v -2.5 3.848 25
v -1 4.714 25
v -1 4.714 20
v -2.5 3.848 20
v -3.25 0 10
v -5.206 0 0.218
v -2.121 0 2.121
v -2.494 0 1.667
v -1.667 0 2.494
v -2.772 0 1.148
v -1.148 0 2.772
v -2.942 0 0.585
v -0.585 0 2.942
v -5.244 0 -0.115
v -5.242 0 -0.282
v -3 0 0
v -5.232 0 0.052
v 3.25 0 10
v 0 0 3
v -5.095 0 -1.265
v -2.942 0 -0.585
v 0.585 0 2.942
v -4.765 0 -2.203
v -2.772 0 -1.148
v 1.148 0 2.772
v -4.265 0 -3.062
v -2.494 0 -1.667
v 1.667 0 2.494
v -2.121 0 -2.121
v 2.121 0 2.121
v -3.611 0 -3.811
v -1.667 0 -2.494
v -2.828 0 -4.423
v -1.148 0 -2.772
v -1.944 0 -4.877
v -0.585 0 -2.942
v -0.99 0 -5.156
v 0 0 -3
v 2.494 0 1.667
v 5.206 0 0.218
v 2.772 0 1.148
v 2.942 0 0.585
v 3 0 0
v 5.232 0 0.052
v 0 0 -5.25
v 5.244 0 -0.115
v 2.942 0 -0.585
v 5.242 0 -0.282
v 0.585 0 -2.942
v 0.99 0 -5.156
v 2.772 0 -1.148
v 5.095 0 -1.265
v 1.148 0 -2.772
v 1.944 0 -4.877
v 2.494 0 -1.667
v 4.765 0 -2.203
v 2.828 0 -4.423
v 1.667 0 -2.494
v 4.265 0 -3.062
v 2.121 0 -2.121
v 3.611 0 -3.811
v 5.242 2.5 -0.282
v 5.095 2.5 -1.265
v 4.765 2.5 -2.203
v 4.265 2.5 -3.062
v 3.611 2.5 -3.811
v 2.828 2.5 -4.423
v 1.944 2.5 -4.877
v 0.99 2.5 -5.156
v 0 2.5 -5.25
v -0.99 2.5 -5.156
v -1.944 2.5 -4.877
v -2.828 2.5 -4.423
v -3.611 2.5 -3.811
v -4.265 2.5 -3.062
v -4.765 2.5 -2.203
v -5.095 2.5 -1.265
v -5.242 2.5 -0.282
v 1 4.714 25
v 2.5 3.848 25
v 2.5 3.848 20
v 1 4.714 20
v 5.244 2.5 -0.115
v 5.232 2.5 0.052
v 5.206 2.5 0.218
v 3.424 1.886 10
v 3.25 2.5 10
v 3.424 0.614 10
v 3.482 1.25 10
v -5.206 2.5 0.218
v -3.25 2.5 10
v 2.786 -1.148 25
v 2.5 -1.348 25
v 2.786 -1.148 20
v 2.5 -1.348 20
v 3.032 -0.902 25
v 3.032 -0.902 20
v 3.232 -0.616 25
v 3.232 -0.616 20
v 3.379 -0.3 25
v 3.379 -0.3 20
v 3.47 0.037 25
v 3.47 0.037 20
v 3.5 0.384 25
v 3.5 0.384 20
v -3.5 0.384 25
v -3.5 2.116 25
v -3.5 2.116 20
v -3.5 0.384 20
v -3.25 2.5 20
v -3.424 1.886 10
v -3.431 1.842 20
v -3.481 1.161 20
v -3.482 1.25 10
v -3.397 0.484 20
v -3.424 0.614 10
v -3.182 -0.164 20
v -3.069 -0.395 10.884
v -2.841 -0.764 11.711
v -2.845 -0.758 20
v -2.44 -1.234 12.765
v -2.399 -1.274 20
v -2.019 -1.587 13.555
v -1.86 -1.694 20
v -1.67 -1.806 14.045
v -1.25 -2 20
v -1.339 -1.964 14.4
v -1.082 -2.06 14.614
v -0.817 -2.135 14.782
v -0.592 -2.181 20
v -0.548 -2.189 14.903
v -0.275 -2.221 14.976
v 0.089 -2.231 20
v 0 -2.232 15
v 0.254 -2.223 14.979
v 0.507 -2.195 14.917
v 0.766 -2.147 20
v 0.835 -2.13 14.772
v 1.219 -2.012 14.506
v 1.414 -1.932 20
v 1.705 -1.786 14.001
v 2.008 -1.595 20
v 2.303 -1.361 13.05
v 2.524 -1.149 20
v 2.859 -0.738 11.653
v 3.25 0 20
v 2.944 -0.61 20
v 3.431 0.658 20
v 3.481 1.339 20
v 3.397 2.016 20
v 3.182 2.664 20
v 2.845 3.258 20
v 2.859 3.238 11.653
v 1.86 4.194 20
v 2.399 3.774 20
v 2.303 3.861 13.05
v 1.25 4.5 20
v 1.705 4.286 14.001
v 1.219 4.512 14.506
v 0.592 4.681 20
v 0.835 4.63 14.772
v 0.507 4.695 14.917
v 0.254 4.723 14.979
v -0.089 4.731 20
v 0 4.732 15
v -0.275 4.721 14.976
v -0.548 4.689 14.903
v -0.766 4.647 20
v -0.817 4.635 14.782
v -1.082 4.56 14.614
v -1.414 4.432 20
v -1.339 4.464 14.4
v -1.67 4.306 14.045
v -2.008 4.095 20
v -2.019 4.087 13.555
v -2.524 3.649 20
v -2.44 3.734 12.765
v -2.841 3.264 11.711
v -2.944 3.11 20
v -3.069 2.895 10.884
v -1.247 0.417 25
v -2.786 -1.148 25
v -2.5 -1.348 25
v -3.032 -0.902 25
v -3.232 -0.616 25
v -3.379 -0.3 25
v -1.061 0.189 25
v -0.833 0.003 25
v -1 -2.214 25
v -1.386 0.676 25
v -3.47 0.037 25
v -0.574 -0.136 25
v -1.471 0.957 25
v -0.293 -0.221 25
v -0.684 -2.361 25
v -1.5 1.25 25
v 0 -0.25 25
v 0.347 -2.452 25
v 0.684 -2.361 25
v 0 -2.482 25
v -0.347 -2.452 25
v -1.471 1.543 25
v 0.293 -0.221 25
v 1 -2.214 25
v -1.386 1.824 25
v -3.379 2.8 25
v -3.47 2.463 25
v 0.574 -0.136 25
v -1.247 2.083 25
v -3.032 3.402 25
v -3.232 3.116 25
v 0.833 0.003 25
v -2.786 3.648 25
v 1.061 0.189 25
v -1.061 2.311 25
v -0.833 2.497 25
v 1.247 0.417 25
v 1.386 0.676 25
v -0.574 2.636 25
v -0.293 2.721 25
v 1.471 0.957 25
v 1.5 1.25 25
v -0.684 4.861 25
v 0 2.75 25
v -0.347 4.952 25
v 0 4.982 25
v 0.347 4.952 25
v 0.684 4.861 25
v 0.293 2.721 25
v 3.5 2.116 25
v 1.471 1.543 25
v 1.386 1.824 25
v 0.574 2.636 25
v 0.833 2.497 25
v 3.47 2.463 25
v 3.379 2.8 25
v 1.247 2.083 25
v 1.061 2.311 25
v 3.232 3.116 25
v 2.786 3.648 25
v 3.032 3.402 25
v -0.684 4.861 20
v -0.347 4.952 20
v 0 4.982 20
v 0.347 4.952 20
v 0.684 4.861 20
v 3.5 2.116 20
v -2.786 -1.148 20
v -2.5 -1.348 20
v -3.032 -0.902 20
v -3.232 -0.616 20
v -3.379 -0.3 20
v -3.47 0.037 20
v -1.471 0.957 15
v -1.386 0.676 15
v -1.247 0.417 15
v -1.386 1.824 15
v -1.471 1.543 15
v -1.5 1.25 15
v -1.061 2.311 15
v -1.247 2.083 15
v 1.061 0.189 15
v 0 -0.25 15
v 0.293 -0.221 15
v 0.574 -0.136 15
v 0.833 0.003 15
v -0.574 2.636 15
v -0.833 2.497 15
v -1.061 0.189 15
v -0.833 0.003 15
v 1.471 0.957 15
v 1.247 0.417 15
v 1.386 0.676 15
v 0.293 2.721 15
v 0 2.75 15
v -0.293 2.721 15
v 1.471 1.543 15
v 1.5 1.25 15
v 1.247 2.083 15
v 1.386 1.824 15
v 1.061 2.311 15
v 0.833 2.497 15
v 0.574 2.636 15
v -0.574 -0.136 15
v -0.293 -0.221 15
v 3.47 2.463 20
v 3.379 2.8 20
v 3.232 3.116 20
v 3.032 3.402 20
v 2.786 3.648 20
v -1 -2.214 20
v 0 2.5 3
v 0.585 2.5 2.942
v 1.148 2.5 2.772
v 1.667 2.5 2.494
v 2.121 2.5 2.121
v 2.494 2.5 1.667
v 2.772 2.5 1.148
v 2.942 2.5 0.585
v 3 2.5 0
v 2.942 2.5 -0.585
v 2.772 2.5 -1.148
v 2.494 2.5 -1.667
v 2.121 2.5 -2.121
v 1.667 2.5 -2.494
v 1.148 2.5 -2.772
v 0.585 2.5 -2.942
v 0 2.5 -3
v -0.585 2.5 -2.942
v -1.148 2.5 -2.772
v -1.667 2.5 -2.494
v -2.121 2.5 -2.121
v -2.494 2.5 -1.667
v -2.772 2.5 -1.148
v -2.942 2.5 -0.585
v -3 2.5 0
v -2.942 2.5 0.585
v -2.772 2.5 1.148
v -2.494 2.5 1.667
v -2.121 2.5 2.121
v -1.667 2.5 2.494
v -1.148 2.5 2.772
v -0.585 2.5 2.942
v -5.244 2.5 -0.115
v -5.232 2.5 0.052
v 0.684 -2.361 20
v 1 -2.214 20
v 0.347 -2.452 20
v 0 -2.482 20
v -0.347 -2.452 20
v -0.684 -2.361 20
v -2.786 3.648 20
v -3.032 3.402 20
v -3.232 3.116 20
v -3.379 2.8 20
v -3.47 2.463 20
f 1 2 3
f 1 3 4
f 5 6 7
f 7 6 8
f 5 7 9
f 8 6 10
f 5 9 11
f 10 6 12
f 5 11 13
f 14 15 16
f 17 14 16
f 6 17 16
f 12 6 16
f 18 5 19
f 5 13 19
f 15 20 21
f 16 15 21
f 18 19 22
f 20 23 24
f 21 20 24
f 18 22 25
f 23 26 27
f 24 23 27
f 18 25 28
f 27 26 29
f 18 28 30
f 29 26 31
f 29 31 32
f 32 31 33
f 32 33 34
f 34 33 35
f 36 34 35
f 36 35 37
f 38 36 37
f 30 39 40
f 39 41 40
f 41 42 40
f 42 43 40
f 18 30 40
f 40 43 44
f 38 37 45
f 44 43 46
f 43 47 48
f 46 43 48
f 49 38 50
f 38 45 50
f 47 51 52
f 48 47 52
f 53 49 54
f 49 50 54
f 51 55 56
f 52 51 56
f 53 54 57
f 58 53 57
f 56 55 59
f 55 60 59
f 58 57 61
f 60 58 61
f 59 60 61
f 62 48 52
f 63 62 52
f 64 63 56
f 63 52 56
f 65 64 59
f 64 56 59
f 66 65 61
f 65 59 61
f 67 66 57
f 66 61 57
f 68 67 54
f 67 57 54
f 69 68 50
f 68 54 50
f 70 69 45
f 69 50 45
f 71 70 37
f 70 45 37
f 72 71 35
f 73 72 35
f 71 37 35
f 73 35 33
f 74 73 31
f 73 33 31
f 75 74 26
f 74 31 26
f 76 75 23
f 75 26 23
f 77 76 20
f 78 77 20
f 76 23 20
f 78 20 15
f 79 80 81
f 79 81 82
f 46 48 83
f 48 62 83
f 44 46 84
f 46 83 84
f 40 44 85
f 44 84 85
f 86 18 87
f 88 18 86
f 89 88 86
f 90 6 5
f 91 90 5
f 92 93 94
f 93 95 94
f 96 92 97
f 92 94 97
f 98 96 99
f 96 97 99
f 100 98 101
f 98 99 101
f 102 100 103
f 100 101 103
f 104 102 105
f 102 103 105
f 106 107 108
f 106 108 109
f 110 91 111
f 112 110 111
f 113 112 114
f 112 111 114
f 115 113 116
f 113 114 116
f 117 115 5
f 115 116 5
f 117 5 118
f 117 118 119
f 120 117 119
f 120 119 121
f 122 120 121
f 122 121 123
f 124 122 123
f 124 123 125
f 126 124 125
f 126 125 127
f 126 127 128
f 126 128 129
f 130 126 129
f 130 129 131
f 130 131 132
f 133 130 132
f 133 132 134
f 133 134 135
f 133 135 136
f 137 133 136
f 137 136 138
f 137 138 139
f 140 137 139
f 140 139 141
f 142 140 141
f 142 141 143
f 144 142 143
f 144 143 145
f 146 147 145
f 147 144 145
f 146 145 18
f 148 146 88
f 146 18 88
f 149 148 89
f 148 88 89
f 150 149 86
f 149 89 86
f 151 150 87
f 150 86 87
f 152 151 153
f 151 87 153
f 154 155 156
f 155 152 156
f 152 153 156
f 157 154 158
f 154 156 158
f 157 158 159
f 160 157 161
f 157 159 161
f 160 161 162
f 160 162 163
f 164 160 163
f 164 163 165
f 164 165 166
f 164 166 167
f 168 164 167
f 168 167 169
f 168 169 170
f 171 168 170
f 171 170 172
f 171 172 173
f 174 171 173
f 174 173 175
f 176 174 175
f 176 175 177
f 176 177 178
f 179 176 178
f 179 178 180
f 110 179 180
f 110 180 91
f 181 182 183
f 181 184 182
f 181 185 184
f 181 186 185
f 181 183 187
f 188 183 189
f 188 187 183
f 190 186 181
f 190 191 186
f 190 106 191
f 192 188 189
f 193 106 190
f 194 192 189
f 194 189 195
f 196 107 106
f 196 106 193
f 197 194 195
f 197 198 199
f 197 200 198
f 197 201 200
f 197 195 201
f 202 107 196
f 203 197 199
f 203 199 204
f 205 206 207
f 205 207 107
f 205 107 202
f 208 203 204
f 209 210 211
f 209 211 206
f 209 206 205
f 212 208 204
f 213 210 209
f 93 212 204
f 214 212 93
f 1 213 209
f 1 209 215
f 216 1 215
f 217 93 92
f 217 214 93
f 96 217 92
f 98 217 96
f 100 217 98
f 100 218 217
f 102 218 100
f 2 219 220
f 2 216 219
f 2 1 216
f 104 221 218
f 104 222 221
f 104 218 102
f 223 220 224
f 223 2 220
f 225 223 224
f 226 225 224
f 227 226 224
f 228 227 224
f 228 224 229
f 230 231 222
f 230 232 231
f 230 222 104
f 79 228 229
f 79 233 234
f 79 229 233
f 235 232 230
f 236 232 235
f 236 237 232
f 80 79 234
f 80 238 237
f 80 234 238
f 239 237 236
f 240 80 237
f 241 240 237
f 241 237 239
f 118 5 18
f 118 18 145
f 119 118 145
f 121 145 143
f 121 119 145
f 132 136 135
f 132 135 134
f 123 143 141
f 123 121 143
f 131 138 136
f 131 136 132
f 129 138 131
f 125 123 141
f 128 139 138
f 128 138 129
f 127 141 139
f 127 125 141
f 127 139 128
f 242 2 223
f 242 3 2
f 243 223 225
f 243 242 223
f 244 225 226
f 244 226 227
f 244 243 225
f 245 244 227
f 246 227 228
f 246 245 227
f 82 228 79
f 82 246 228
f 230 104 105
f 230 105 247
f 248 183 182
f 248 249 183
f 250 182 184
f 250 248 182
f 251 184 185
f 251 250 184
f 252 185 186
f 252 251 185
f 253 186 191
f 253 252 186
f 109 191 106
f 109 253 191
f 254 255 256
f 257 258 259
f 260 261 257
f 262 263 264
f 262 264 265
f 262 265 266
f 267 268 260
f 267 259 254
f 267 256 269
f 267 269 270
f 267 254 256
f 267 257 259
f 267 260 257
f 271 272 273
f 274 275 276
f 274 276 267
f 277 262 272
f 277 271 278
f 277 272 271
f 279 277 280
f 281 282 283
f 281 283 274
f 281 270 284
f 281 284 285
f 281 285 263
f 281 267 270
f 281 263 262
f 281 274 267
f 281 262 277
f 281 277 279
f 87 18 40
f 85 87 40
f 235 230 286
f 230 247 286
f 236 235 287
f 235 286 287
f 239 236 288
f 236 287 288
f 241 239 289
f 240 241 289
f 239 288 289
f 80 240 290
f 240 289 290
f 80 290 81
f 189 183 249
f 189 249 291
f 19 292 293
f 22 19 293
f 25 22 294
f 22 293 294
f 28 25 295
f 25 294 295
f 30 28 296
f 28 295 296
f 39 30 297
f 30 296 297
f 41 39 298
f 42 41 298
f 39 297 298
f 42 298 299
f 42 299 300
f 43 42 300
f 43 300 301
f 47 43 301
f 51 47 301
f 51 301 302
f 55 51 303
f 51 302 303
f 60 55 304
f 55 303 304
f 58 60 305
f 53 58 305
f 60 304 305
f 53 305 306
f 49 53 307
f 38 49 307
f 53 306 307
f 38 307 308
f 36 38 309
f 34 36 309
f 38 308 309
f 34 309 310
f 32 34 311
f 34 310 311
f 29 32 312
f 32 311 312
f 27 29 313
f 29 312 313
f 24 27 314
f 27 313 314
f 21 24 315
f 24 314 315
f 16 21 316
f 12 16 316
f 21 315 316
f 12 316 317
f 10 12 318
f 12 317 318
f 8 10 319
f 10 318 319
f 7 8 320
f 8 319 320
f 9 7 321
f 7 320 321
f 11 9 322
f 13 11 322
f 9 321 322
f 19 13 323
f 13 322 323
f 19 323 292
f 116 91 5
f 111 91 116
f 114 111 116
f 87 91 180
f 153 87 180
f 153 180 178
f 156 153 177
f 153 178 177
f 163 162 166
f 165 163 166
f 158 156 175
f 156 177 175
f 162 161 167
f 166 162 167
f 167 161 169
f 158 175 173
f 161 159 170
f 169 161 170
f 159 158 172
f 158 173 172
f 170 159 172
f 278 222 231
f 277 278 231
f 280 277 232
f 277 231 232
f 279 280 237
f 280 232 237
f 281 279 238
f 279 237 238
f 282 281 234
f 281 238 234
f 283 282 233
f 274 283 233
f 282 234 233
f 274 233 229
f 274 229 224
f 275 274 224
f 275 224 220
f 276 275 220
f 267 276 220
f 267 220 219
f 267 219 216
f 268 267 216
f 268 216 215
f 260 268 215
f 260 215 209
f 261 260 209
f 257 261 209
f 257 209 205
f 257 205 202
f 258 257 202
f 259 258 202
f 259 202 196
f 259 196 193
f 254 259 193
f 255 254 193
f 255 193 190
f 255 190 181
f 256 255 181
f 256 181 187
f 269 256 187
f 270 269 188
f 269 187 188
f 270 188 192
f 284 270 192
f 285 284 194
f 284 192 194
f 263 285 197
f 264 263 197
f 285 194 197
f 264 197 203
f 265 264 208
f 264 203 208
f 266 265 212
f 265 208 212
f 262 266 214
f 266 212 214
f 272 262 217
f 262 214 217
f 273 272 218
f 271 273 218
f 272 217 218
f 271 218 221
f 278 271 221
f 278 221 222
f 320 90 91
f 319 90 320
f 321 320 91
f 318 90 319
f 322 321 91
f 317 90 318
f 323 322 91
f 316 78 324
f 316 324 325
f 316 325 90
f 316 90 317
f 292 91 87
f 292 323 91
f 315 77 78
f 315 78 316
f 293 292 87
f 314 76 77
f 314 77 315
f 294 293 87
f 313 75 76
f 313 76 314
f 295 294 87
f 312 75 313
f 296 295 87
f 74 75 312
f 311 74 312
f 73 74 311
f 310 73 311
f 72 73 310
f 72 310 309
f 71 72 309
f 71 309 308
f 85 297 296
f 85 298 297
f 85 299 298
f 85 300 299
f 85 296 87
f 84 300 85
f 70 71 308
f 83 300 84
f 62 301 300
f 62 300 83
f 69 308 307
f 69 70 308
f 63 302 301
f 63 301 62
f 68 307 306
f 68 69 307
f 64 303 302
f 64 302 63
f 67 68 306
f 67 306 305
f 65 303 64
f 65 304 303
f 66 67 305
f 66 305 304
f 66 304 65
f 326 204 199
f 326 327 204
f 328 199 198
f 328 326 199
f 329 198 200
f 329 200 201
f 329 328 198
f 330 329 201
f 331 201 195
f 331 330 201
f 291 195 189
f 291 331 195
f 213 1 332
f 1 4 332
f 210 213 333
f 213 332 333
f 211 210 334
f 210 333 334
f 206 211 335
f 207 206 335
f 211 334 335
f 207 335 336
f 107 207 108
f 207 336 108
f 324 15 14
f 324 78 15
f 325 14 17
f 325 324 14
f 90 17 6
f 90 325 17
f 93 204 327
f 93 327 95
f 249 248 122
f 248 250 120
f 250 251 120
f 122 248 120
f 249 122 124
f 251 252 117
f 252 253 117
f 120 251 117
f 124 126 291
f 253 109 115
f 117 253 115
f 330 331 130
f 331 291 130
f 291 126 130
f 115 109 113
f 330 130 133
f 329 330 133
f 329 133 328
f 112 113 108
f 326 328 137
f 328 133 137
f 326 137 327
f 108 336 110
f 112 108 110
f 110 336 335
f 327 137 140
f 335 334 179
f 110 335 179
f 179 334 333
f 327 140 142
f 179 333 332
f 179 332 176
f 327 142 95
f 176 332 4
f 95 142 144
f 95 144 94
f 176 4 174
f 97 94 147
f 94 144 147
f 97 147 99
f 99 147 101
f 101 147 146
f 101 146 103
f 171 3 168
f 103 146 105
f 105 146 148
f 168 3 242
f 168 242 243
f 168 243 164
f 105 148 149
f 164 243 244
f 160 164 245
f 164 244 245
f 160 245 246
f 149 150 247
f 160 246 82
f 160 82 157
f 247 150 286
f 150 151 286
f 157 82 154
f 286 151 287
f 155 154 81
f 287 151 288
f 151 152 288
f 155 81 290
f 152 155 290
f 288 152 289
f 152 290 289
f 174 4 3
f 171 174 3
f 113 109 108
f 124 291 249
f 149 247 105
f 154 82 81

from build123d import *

# Parameters (mm, degrees)
EXTRUDE_1_DEPTH          = 2.5
SKETCH_2_R               = 3
CUT_EXTRUDE_1_DEPTH      = 2.5
FILLET_1_R               = 2
SKETCH_3_R               = 3.482097069
EXTRUDE_2_DEPTH          = 15
CUT_EXTRUDE_2_DEPTH      = 15
CUT_EXTRUDE_2_DEPTH_BACK = 15
SKETCH_6_R               = 1.5
CUT_EXTRUDE_3_DEPTH      = 10
EXTRUDE_3_DEPTH          = 5
SKETCH_8_R               = 1.5
CUT_EXTRUDE_4_DEPTH      = 5
FILLET_2_R               = 2


with BuildPart() as part:
    # 草图1 → 凸台-拉伸1 (new body)
    with BuildSketch(Plane(origin=(0, 0, 0), x_dir=(1, 0, 0), z_dir=(0, 1, 0))):
        with BuildLine():
            ThreePointArc((5.25, 0), (0, 5.25), (-5.25, 0))
            Line((-5.25, 0), (-3.25, -10))
            Line((-3.25, -10), (3.25, -10))
            Line((3.25, -10), (5.25, 0))
        make_face()
    extrude(amount=EXTRUDE_1_DEPTH)

    # 草图2 → 切除-拉伸1 (cut)
    with BuildSketch(Plane(origin=(0, 2.5, 0), x_dir=(1, 0, 0), z_dir=(0, 1, 0))):
        Circle(SKETCH_2_R)
    extrude(amount=-CUT_EXTRUDE_1_DEPTH, mode=Mode.SUBTRACT)

    # 圆角1
    fillet_1_edges = [part.edges().sort_by_distance(p)[0] for p in [
        (-5.25, 1.25, 0),
        (5.25, 1.25, 0),
    ]]
    fillet(fillet_1_edges, radius=FILLET_1_R)

    # 草图3 → 凸台-拉伸2 (add)
    with BuildSketch(Plane.XY.offset(10)):
        with Locations((0, 1.25)):
            Circle(SKETCH_3_R)
    extrude(amount=EXTRUDE_2_DEPTH)

    # 草图5 → 切除-拉伸2 (cut, two sides: drawn at the far end of the back side and taken through both)
    with BuildSketch(Plane(origin=(0, 0, 0), x_dir=(0, 0, -1), z_dir=(1, 0, 0)).offset(-CUT_EXTRUDE_2_DEPTH_BACK)):
        Polygon((-10, 2.5), (-15, 4.732097069), (-10, 4.732097069), align=None)
        Polygon((-10, 0), (-15, -2.232097069), (-10, -2.232097069), align=None)
    extrude(amount=CUT_EXTRUDE_2_DEPTH + CUT_EXTRUDE_2_DEPTH_BACK, mode=Mode.SUBTRACT)

    # 草图6 → 切除-拉伸3 (cut)
    with BuildSketch(Plane.XY.offset(25)):
        with Locations((0, 1.25)):
            Circle(SKETCH_6_R)
    extrude(amount=-CUT_EXTRUDE_3_DEPTH, mode=Mode.SUBTRACT)

    # 草图7 → 凸台-拉伸3 (add)
    with BuildSketch(Plane.XY.offset(25)):
        Polygon((0, 5.291451884), (-3.5, 3.270725942), (-3.5, -0.770725942), (0, -2.791451884), (3.5, -0.770725942), (3.5, 3.270725942), align=None)
    extrude(amount=-EXTRUDE_3_DEPTH)

    # 草图8 → 切除-拉伸4 (cut)
    with BuildSketch(Plane.XY.offset(25)):
        with Locations((0, 1.25)):
            Circle(SKETCH_8_R)
    extrude(amount=-CUT_EXTRUDE_4_DEPTH, mode=Mode.SUBTRACT)

    # 圆角2
    fillet_2_edges = [part.edges().sort_by_distance(p)[0] for p in [
        (0, -2.791451884, 22.5),
        (3.5, -0.770725942, 22.5),
        (-3.5, -0.770725942, 22.5),
        (-3.5, 3.270725942, 22.5),
        (0, 5.291451884, 22.5),
        (3.5, 3.270725942, 22.5),
    ]]
    fillet(fillet_2_edges, radius=FILLET_2_R)


solid = part.part
